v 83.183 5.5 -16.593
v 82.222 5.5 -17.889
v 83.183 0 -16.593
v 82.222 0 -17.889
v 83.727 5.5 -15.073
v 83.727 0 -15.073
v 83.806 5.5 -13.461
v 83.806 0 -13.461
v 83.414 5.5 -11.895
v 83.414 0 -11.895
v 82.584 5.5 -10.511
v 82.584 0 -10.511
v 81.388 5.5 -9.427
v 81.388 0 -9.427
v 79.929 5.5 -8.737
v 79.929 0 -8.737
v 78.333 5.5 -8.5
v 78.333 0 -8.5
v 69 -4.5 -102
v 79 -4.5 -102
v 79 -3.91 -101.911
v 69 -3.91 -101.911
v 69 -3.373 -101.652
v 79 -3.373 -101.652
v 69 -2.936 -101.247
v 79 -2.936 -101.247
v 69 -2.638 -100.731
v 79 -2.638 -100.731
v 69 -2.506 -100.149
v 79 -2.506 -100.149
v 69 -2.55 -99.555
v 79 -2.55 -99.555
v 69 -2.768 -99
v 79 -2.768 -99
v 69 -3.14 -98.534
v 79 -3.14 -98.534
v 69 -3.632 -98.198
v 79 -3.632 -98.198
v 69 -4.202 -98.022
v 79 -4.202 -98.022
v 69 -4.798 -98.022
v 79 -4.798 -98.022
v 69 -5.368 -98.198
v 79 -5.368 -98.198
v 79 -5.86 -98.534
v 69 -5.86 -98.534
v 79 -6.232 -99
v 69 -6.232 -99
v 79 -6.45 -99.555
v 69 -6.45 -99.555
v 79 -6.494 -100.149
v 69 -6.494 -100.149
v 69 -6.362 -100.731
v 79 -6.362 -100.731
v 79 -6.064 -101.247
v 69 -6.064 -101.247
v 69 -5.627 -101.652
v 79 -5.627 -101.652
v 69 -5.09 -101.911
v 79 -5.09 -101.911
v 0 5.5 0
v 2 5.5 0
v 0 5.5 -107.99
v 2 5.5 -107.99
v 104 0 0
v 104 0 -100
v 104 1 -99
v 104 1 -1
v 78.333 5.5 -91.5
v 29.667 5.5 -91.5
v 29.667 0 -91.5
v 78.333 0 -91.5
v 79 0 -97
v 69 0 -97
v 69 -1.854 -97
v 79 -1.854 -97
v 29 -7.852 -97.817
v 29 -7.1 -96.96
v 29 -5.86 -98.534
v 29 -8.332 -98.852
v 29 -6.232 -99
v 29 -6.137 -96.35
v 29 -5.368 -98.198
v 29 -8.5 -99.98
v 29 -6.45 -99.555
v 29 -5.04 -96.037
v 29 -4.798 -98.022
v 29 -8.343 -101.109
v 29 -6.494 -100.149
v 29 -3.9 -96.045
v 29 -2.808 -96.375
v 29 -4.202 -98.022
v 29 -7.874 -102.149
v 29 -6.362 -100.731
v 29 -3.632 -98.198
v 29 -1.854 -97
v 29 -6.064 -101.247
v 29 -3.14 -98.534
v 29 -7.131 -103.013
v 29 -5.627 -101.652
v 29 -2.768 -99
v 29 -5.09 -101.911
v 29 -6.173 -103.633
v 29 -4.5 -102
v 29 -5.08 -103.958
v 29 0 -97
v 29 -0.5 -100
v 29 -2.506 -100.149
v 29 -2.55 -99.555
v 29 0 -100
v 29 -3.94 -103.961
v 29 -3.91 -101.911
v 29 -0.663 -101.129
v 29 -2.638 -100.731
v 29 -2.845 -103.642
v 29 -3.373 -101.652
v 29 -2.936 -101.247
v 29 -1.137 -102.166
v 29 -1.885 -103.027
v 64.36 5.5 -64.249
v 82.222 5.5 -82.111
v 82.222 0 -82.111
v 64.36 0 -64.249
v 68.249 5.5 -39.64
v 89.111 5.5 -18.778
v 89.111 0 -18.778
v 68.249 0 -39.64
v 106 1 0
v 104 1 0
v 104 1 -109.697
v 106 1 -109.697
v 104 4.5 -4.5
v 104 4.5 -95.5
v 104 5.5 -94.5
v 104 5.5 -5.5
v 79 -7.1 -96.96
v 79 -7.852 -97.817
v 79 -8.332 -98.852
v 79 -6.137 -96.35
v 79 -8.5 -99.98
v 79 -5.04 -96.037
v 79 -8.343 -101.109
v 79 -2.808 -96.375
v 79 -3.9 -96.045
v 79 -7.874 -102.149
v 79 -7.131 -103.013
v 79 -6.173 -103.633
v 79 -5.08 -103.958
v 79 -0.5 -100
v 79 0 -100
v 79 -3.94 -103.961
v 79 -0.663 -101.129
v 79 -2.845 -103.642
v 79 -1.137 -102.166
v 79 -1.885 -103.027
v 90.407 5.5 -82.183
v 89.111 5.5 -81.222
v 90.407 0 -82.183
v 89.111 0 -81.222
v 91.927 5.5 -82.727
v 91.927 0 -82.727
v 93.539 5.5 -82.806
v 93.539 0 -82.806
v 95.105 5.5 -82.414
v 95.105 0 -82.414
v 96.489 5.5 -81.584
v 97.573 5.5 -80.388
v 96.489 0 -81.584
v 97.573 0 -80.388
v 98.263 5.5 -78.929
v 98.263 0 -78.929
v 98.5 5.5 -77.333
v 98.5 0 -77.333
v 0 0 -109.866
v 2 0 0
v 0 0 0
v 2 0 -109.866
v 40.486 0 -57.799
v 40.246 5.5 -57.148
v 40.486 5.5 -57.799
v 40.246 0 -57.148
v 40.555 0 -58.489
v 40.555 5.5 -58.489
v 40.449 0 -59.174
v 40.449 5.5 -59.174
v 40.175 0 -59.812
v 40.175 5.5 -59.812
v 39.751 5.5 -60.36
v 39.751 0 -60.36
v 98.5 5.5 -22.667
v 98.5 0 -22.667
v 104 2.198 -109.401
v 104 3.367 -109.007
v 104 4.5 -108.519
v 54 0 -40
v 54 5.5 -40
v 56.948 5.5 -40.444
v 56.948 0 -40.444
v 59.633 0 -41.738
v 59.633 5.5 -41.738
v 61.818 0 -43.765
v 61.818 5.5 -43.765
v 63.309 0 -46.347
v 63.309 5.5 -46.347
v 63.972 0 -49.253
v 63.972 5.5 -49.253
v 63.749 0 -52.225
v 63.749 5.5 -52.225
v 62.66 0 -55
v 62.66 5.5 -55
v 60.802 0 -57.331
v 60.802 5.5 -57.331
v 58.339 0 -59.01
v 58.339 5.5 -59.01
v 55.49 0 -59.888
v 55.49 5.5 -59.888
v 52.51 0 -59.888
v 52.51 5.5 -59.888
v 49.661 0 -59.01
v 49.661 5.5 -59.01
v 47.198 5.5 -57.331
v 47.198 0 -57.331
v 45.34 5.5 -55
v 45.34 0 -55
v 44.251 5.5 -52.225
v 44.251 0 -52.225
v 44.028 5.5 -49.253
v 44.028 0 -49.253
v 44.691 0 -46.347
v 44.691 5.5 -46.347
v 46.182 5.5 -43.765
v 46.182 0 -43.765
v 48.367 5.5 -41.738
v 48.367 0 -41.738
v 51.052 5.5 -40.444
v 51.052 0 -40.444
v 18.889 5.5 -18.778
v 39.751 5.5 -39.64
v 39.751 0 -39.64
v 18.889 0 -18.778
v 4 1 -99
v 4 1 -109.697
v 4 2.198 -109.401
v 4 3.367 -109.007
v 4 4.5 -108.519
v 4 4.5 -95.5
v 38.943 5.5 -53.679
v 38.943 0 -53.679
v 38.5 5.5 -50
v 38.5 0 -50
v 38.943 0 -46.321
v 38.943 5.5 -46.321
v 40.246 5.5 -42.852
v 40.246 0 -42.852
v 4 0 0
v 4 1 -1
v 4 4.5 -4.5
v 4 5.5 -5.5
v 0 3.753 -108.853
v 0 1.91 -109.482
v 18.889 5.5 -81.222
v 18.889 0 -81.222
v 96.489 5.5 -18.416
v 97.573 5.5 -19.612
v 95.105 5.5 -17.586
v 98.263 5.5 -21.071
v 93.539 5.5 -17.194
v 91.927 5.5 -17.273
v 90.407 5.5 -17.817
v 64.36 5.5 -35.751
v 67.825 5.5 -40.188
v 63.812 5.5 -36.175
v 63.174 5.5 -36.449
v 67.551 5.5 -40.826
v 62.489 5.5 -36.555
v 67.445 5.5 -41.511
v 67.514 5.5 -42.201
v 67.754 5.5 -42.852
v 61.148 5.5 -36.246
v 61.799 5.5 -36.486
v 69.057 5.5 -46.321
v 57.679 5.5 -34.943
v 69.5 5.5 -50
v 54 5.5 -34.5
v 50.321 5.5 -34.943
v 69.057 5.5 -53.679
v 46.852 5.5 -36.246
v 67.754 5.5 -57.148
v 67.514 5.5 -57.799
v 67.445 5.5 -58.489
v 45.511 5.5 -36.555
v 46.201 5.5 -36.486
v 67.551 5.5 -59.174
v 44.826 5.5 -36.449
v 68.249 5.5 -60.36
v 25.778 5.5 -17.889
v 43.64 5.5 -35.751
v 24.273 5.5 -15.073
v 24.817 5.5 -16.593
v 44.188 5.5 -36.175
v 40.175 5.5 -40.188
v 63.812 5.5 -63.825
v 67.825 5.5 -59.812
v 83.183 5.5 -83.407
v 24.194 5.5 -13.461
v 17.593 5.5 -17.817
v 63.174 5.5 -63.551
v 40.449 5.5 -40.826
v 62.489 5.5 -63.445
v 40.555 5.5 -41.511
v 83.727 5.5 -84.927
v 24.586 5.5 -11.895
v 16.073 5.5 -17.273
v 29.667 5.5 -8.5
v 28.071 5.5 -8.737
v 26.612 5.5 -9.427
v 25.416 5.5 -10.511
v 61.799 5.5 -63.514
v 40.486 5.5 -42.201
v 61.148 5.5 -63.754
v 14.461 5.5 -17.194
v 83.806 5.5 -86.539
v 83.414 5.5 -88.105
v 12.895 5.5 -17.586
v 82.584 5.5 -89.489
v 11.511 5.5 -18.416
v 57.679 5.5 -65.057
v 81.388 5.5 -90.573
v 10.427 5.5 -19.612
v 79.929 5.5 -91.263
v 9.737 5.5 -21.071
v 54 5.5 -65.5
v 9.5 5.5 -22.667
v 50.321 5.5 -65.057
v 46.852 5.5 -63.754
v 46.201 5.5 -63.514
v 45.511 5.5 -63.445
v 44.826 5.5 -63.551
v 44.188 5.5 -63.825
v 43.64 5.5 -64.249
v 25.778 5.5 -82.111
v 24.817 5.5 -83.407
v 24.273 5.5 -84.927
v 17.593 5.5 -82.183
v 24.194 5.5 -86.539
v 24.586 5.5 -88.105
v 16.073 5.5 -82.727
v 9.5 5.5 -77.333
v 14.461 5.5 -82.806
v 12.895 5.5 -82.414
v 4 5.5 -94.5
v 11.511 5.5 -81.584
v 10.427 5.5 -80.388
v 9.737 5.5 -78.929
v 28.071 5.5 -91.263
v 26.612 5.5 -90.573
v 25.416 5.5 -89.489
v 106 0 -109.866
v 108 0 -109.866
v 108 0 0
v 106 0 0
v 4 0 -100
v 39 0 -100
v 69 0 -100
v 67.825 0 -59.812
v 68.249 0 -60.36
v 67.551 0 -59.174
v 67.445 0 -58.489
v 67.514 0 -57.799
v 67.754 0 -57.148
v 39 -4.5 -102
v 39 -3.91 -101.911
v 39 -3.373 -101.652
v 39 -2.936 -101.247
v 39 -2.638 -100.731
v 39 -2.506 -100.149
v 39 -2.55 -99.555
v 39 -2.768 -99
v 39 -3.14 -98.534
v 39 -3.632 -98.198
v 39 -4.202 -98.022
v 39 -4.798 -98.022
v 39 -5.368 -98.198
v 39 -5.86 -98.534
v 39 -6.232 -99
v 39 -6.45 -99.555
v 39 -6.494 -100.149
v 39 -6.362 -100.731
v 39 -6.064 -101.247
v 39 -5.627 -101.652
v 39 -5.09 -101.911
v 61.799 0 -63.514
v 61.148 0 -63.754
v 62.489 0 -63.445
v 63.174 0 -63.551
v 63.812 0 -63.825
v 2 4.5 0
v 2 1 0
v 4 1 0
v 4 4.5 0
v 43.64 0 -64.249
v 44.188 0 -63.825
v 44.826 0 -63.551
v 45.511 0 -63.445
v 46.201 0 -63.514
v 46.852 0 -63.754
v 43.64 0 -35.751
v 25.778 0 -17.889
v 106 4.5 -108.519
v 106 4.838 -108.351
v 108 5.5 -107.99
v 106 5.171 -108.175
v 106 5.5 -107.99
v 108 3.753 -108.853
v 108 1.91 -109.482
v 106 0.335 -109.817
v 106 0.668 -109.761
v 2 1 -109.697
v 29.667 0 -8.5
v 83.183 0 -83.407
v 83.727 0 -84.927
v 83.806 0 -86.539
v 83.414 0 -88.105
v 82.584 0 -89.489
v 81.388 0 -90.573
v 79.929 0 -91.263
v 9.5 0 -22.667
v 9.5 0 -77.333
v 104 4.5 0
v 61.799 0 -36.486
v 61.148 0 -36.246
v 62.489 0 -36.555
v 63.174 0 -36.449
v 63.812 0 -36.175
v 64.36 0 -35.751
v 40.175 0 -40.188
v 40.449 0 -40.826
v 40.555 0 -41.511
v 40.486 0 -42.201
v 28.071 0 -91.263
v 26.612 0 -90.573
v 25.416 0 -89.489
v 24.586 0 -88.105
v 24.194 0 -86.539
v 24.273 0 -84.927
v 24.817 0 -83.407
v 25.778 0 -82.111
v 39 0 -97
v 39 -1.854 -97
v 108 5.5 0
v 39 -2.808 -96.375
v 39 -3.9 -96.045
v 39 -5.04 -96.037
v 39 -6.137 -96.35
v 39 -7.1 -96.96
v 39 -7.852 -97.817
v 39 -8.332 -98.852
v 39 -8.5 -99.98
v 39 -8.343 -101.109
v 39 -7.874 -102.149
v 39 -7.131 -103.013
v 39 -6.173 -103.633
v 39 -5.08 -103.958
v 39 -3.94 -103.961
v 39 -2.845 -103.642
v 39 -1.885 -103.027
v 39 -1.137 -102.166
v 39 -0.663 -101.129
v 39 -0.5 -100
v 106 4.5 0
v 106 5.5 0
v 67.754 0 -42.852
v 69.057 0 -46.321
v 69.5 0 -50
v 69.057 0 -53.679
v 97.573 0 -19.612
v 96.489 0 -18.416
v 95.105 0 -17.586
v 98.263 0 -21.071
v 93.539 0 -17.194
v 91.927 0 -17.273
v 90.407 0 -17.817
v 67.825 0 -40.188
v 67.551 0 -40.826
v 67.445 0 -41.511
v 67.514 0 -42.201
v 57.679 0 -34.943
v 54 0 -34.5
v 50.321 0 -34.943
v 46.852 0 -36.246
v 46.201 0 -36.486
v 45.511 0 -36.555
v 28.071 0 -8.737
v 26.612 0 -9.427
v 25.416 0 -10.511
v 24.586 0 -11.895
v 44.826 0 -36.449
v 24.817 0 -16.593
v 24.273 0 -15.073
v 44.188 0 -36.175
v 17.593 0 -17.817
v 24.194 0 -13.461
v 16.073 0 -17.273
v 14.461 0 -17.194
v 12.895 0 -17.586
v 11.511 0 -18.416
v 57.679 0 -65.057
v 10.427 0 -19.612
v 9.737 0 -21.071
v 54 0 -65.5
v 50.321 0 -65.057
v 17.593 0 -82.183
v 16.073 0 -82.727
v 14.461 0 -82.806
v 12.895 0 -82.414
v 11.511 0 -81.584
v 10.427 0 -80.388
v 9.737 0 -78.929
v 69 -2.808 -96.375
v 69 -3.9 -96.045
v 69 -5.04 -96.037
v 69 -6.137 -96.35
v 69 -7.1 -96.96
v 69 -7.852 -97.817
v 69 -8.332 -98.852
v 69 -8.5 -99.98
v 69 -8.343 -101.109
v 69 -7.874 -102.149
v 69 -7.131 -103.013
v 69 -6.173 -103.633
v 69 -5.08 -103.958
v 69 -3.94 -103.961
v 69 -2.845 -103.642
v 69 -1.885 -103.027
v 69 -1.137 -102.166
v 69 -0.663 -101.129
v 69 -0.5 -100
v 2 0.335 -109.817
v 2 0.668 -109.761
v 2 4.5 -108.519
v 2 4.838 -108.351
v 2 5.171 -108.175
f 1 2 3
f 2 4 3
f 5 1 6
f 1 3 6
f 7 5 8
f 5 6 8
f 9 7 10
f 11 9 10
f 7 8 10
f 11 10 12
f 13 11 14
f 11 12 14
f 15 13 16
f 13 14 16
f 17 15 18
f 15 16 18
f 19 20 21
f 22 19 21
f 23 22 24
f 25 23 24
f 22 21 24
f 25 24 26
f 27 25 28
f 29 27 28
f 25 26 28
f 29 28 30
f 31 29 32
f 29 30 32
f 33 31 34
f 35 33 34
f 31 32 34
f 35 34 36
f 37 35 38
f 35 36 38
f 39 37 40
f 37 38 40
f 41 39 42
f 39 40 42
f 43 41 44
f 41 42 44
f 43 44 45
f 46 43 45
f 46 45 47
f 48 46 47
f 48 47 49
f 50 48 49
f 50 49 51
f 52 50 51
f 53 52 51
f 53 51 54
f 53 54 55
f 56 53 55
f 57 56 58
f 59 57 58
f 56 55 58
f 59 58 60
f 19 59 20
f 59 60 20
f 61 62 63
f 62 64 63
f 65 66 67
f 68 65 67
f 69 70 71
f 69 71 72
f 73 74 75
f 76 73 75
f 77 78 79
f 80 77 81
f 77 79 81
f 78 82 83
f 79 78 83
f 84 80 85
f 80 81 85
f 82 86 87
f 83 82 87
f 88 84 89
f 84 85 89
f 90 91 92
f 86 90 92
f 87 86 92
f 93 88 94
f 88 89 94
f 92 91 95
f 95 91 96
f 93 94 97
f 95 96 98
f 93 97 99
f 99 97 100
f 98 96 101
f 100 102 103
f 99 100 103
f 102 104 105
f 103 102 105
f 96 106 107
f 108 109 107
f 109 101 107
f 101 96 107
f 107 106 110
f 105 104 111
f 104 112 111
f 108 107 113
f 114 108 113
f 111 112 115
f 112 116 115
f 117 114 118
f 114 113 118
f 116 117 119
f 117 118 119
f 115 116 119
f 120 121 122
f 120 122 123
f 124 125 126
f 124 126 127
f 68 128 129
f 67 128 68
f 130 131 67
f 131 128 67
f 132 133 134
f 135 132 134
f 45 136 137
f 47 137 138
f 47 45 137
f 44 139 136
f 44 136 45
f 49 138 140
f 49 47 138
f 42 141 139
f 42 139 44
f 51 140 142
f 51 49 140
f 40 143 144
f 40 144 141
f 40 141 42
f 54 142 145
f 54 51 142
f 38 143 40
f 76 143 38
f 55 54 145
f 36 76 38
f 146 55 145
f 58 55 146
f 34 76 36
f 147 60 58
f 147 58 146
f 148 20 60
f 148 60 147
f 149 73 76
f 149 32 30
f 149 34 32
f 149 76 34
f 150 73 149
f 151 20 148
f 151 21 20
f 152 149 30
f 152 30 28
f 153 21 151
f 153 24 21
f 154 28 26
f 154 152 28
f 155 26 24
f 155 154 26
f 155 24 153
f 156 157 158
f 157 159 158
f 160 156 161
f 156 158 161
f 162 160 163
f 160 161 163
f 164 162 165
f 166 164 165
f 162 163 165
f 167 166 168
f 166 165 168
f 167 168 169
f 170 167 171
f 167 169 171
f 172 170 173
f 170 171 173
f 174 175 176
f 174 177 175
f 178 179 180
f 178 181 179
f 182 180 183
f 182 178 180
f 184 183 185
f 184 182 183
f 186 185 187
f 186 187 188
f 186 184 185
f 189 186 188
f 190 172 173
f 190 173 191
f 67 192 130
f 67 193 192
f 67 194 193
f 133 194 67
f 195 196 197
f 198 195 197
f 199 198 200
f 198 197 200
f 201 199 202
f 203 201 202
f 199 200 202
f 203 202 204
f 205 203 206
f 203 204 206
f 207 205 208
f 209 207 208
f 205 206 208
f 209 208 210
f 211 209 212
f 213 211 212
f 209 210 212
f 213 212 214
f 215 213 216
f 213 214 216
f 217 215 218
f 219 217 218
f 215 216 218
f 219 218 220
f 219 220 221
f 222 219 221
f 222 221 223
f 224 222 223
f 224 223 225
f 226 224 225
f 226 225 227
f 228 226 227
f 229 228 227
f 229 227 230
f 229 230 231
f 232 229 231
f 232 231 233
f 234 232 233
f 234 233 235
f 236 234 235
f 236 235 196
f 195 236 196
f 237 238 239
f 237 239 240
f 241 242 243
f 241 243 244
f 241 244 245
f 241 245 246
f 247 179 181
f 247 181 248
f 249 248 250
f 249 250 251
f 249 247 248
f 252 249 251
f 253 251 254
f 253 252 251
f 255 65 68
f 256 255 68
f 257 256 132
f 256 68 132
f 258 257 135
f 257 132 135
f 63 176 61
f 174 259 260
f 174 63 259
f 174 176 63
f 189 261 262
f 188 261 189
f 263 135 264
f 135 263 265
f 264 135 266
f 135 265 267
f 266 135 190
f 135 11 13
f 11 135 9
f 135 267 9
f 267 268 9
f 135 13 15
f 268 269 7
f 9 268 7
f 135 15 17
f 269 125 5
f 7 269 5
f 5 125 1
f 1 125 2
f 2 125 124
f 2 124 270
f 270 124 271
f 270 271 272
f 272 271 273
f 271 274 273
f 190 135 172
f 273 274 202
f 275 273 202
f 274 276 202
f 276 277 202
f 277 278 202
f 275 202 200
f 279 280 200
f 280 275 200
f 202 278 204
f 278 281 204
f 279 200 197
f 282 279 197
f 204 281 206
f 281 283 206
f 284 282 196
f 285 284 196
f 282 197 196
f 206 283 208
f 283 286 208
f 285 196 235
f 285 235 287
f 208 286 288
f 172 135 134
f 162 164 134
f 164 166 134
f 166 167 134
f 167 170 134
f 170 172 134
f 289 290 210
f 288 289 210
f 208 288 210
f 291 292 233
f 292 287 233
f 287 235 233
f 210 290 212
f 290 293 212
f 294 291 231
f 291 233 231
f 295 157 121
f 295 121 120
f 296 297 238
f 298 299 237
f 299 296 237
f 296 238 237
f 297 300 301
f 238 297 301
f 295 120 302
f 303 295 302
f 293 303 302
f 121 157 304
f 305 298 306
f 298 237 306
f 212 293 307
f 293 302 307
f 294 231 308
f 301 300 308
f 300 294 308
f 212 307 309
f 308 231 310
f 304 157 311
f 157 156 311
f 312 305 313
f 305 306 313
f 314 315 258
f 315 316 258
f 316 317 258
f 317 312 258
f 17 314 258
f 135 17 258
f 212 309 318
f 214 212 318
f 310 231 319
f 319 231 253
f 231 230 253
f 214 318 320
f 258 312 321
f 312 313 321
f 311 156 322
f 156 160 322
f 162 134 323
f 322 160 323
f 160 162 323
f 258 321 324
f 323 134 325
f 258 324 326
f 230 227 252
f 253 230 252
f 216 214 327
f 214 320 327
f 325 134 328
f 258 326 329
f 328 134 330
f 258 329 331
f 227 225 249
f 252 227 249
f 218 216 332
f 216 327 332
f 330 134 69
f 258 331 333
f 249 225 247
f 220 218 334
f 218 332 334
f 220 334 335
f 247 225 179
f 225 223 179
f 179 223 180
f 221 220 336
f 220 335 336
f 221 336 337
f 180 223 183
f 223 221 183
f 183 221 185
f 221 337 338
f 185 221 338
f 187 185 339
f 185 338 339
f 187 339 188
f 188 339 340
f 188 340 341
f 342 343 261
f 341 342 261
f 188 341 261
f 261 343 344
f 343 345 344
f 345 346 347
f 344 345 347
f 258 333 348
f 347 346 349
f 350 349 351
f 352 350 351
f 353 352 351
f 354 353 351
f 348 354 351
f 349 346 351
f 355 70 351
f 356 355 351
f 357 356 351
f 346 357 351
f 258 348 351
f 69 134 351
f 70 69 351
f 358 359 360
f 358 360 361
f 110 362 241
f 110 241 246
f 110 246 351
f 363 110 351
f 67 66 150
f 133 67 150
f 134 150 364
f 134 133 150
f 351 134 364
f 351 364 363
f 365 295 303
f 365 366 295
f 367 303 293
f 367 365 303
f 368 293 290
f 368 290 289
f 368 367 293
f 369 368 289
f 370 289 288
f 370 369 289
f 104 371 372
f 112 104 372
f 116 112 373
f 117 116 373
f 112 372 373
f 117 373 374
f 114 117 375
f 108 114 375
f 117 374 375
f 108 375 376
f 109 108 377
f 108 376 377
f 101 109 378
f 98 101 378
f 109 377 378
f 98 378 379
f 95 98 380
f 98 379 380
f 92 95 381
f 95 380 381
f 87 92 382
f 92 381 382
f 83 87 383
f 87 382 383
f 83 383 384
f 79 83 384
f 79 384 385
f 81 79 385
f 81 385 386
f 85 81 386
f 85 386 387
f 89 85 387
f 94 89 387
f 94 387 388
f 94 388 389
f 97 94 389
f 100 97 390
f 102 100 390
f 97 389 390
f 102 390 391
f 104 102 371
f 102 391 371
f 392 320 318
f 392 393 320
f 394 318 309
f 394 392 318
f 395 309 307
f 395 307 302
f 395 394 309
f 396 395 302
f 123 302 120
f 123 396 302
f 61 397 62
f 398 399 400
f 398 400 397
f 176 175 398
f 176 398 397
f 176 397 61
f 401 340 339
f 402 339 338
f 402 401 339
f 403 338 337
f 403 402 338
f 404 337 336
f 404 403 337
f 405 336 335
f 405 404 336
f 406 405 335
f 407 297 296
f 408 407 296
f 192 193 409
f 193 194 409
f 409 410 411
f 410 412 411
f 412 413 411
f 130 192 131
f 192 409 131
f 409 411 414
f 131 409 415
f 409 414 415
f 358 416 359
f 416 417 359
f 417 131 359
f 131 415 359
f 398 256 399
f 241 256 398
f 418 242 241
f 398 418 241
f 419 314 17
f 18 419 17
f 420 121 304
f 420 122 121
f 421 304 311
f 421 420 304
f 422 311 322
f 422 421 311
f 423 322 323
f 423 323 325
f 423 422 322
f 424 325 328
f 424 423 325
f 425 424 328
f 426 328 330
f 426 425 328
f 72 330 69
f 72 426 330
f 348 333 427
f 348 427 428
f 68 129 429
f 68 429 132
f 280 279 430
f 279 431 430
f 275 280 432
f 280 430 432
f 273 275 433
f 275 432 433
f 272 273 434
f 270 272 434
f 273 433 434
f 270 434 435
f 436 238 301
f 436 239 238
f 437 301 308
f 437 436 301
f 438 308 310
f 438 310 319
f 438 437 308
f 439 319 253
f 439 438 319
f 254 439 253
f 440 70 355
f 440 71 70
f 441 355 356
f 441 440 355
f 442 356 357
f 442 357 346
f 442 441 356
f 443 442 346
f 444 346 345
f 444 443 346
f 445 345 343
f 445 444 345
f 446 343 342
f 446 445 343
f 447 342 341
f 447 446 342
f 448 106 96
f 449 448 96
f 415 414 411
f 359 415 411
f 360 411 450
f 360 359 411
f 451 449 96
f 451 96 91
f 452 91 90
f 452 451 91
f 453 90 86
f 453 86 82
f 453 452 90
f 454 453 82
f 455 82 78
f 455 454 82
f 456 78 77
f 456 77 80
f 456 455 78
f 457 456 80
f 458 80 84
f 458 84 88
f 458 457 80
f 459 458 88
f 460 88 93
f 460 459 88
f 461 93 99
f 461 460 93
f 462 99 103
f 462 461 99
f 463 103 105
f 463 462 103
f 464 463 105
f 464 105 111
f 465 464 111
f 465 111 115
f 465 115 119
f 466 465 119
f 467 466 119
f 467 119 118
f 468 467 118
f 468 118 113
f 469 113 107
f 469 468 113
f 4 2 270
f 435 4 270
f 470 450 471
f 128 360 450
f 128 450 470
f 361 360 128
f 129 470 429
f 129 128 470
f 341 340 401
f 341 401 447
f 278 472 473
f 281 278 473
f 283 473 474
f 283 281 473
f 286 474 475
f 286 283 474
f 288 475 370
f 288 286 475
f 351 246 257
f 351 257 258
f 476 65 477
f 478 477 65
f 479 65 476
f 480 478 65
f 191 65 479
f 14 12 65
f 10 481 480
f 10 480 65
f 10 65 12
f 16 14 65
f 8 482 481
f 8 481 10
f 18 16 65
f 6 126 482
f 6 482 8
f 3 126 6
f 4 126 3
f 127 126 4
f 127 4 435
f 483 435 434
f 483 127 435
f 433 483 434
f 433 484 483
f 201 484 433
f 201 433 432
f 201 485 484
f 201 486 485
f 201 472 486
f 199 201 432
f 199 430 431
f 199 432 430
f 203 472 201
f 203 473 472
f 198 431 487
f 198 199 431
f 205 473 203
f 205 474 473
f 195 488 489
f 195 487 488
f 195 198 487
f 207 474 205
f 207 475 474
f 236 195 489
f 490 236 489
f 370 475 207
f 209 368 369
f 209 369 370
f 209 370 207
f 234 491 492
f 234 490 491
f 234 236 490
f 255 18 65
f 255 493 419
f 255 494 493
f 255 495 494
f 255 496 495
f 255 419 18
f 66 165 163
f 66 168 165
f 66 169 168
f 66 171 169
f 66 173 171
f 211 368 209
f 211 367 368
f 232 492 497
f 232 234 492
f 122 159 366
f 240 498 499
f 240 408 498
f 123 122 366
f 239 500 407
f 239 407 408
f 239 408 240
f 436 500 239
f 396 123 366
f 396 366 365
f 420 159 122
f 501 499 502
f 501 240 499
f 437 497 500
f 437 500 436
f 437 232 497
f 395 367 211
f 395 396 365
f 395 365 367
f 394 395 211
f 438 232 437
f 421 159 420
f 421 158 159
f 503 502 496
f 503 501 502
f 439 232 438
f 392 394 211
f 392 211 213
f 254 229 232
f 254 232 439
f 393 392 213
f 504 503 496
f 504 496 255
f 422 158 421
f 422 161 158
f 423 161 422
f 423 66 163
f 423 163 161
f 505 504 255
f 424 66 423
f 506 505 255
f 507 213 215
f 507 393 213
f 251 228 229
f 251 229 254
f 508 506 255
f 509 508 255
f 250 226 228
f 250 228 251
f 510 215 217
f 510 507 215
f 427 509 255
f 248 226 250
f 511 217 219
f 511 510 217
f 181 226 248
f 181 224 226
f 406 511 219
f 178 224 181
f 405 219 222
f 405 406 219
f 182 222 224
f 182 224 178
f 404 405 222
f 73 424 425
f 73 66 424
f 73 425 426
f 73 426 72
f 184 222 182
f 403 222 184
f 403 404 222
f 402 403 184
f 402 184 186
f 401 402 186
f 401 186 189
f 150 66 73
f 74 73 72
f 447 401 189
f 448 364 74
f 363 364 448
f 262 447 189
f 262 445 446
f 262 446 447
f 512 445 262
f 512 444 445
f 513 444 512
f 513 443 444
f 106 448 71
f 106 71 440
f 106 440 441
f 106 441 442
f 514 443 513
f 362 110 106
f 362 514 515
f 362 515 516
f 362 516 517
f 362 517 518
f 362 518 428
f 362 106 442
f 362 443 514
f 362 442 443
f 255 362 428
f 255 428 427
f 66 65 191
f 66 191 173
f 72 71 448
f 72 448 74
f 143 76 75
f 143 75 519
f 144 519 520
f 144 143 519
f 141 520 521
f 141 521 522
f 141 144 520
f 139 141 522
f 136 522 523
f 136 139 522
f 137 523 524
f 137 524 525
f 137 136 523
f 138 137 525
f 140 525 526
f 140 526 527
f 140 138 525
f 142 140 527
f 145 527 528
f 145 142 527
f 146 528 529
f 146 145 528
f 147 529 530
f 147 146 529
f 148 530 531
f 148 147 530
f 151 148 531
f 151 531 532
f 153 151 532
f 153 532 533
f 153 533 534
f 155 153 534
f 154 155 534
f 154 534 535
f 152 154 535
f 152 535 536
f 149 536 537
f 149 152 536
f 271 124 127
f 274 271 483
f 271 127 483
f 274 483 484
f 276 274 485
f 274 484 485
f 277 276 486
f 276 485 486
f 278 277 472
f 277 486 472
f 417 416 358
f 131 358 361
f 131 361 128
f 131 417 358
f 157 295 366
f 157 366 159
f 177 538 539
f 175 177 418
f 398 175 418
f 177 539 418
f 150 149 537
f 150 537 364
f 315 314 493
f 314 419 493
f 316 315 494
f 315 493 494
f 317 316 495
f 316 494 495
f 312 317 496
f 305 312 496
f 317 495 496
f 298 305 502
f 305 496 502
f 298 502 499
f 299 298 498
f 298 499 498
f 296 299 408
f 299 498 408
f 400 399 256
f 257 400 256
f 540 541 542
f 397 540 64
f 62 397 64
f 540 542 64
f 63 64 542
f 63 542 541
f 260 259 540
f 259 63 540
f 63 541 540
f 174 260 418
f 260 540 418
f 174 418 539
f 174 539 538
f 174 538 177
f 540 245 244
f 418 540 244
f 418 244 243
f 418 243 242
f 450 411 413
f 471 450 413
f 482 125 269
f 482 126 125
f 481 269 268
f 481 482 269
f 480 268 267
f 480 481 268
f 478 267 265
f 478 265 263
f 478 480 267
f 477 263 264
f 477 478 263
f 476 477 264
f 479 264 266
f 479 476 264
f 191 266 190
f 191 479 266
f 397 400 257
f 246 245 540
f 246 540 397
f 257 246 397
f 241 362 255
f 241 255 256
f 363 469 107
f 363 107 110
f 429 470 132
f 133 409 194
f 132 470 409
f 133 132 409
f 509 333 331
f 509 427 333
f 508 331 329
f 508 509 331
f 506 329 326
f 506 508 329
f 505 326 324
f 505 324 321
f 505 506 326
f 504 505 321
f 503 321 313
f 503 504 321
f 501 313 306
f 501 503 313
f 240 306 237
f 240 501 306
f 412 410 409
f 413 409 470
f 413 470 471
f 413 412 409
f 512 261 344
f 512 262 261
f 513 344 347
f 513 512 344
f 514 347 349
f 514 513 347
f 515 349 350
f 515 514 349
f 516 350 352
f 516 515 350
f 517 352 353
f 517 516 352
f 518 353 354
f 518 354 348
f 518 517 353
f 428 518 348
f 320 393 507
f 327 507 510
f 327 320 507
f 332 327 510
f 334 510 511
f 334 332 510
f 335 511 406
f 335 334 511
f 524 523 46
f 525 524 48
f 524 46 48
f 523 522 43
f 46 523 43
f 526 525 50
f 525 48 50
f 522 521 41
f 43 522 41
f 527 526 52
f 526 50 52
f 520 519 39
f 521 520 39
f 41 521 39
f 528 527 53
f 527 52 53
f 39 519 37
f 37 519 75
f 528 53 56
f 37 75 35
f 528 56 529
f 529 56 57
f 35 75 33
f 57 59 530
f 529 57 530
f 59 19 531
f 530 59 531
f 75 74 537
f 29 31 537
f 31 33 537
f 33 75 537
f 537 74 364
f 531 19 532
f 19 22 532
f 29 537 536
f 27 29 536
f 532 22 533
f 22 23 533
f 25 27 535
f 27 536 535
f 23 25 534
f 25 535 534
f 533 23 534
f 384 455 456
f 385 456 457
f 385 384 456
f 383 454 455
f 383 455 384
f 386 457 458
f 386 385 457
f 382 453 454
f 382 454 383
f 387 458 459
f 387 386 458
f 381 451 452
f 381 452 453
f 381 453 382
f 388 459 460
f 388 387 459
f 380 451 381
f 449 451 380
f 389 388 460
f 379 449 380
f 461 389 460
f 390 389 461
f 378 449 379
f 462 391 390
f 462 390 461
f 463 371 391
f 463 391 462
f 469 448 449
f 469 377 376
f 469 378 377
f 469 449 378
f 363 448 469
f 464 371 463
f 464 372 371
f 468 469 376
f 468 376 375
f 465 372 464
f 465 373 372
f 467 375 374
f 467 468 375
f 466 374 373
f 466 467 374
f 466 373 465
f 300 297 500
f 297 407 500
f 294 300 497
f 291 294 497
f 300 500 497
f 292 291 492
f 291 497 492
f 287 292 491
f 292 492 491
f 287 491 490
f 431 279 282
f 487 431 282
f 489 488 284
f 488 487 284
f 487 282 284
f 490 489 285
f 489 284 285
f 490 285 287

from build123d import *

# Parameters (mm, degrees)
BOSS_EXTRUDE1_DEPTH = 5.5
SKETCH4_W           = 2
SKETCH4_H           = 1
CUT_EXTRUDE2_DEPTH  = 110
SKETCH5_R           = 10
CUT_EXTRUDE3_DEPTH  = 110
CUT_EXTRUDE4_START  = -4
CUT_EXTRUDE4_DEPTH  = 100
FILLET3_R           = 5.5
FILLET4_R           = 2.75
BOSS_EXTRUDE2_START = -29
SKETCH7_R           = 2
BOSS_EXTRUDE2_DEPTH = 10
BOSS_EXTRUDE3_START = -69
SKETCH7_3_R         = 2
BOSS_EXTRUDE3_DEPTH = 10
CUT_EXTRUDE5_DEPTH  = 155.389928428


with BuildPart() as part:
    # Sketch1 → Boss-Extrude1 (new body)
    with BuildSketch(Plane(origin=(0, 0, 0), x_dir=(1, 0, 0), z_dir=(0, 1, 0))):
        Polygon((0, 110), (4, 110), (4, 100), (104, 100), (104, 110), (108, 110), (108, 0), (0, 0), align=None)
    extrude(amount=BOSS_EXTRUDE1_DEPTH)

    # Sketch4 → Cut-Extrude2 (cut)
    with BuildSketch(Plane(origin=(0, 0, -110), x_dir=(-1, 0, 0), z_dir=(0, 0, -1))):
        with Locations((-3, 0.5)):
            Rectangle(SKETCH4_W, SKETCH4_H)
        with Locations((-3, 5)):
            Rectangle(SKETCH4_W, SKETCH4_H)
        with Locations((-105, 5)):
            Rectangle(SKETCH4_W, SKETCH4_H)
        with Locations((-105, 0.5)):
            Rectangle(SKETCH4_W, SKETCH4_H)
    extrude(amount=-CUT_EXTRUDE2_DEPTH, mode=Mode.SUBTRACT)

    # Sketch5 → Cut-Extrude3 (cut)
    with BuildSketch(Plane(origin=(0, 5.5, 0), x_dir=(1, 0, 0), z_dir=(0, 1, 0))):
        with Locations((54, 50)):
            Circle(SKETCH5_R)
        with BuildLine():
            Line((41.269180349, 41.158267646), (9.5, 9.389087297))
            Line((9.5, 9.389087297), (9.5, 90.610912703))
            Line((9.5, 90.610912703), (41.269180349, 58.841732354))
            ThreePointArc((41.269180349, 58.841732354), (38.5, 50), (41.269180349, 41.158267646))
        make_face()
        with BuildLine():
            Line((98.5, 90.610912703), (98.5, 9.389087297))
            Line((98.5, 9.389087297), (66.730819651, 41.158267646))
            ThreePointArc((66.730819651, 41.158267646), (69.5, 50), (66.730819651, 58.841732354))
            Line((66.730819651, 58.841732354), (98.5, 90.610912703))
        make_face()
        with BuildLine():
            Line((45.158267646, 62.730819651), (16.389087297, 91.5))
            Line((16.389087297, 91.5), (91.610912703, 91.5))
            Line((91.610912703, 91.5), (62.841732354, 62.730819651))
            ThreePointArc((62.841732354, 62.730819651), (54, 65.5), (45.158267646, 62.730819651))
        make_face()
        with BuildLine():
            Line((16.389087297, 8.5), (91.610912703, 8.5))
            Line((91.610912703, 8.5), (62.841732354, 37.269180349))
            ThreePointArc((62.841732354, 37.269180349), (54, 34.5), (45.158267646, 37.269180349))
            Line((45.158267646, 37.269180349), (16.389087297, 8.5))
        make_face()
    extrude(amount=-CUT_EXTRUDE3_DEPTH, mode=Mode.SUBTRACT)

    # Sketch6 → Cut-Extrude4 (cut)
    with BuildSketch(Plane(origin=(108, 0, 0), x_dir=(0, 0, -1), z_dir=(1, 0, 0)).offset(CUT_EXTRUDE4_START)):
        Polygon((0, 0), (5.5, 5.5), (0, 5.5), align=None)
        Polygon((100, 5.5), (100, 0), (94.5, 5.5), align=None)
    extrude(amount=-CUT_EXTRUDE4_DEPTH, mode=Mode.SUBTRACT)

    # Fillet3
    fillet3_edges = [part.edges().sort_by_distance(p)[0] for p in [
        (91.610912703, 2.75, -8.5),
        (98.5, 2.75, -9.389087297),
        (98.5, 2.75, -90.610912703),
        (91.610912703, 2.75, -91.5),
        (16.389087297, 2.75, -91.5),
        (9.5, 2.75, -90.610912703),
        (9.5, 2.75, -9.389087297),
        (16.389087297, 2.75, -8.5),
    ]]
    fillet(fillet3_edges, radius=FILLET3_R)

    # Fillet4
    fillet4_edges = [part.edges().sort_by_distance(p)[0] for p in [
        (66.730819651, 2.75, -41.158267646),
        (66.730819651, 2.75, -58.841732354),
        (62.841732354, 2.75, -62.730819651),
        (45.158267646, 2.75, -62.730819651),
        (41.269180349, 2.75, -41.158267646),
        (41.269180349, 2.75, -58.841732354),
        (62.841732354, 2.75, -37.269180349),
        (45.158267646, 2.75, -37.269180349),
    ]]
    fillet(fillet4_edges, radius=FILLET4_R)

    # Sketch7 → Boss-Extrude2 (add)
    with BuildSketch(Plane(origin=(108, 0, 0), x_dir=(0, 0, -1), z_dir=(1, 0, 0)).offset(BOSS_EXTRUDE2_START)):
        with BuildLine():
            Line((100, 0), (97, 0))
            Line((97, 0), (97, -1.854248689))
            ThreePointArc((97, -1.854248689), (101.645751311, -8.145751311), (100, -0.5))
            Line((100, -0.5), (100, 0))
        make_face()
        with Locations((100, -4.5)):
            Circle(SKETCH7_R, mode=Mode.SUBTRACT)
    extrude(amount=-BOSS_EXTRUDE2_DEPTH)

    # Sketch7<3> → Boss-Extrude3 (add)
    with BuildSketch(Plane(origin=(108, 0, 0), x_dir=(0, 0, -1), z_dir=(1, 0, 0)).offset(BOSS_EXTRUDE3_START)):
        with BuildLine():
            Line((100, 0), (97, 0))
            Line((97, 0), (97, -1.854248689))
            ThreePointArc((97, -1.854248689), (101.645751311, -8.145751311), (100, -0.5))
            Line((100, -0.5), (100, 0))
        make_face()
        with Locations((100, -4.5)):
            Circle(SKETCH7_3_R, mode=Mode.SUBTRACT)
    extrude(amount=-BOSS_EXTRUDE3_DEPTH)

    # Sketch9 → Cut-Extrude5 (cut, through all)
    with BuildSketch(Plane(origin=(108, 0, 0), x_dir=(0, 0, -1), z_dir=(1, 0, 0))):
        with BuildLine():
            Line((110, -2), (115, -2))
            Line((115, -2), (115, 18))
            Line((115, 18), (95, 18))
            Line((95, 18), (95, 13))
            ThreePointArc((95, 13), (105.606601718, 8.606601718), (110, -2))
        make_face()
    extrude(amount=-CUT_EXTRUDE5_DEPTH, mode=Mode.SUBTRACT)


solid = part.part
